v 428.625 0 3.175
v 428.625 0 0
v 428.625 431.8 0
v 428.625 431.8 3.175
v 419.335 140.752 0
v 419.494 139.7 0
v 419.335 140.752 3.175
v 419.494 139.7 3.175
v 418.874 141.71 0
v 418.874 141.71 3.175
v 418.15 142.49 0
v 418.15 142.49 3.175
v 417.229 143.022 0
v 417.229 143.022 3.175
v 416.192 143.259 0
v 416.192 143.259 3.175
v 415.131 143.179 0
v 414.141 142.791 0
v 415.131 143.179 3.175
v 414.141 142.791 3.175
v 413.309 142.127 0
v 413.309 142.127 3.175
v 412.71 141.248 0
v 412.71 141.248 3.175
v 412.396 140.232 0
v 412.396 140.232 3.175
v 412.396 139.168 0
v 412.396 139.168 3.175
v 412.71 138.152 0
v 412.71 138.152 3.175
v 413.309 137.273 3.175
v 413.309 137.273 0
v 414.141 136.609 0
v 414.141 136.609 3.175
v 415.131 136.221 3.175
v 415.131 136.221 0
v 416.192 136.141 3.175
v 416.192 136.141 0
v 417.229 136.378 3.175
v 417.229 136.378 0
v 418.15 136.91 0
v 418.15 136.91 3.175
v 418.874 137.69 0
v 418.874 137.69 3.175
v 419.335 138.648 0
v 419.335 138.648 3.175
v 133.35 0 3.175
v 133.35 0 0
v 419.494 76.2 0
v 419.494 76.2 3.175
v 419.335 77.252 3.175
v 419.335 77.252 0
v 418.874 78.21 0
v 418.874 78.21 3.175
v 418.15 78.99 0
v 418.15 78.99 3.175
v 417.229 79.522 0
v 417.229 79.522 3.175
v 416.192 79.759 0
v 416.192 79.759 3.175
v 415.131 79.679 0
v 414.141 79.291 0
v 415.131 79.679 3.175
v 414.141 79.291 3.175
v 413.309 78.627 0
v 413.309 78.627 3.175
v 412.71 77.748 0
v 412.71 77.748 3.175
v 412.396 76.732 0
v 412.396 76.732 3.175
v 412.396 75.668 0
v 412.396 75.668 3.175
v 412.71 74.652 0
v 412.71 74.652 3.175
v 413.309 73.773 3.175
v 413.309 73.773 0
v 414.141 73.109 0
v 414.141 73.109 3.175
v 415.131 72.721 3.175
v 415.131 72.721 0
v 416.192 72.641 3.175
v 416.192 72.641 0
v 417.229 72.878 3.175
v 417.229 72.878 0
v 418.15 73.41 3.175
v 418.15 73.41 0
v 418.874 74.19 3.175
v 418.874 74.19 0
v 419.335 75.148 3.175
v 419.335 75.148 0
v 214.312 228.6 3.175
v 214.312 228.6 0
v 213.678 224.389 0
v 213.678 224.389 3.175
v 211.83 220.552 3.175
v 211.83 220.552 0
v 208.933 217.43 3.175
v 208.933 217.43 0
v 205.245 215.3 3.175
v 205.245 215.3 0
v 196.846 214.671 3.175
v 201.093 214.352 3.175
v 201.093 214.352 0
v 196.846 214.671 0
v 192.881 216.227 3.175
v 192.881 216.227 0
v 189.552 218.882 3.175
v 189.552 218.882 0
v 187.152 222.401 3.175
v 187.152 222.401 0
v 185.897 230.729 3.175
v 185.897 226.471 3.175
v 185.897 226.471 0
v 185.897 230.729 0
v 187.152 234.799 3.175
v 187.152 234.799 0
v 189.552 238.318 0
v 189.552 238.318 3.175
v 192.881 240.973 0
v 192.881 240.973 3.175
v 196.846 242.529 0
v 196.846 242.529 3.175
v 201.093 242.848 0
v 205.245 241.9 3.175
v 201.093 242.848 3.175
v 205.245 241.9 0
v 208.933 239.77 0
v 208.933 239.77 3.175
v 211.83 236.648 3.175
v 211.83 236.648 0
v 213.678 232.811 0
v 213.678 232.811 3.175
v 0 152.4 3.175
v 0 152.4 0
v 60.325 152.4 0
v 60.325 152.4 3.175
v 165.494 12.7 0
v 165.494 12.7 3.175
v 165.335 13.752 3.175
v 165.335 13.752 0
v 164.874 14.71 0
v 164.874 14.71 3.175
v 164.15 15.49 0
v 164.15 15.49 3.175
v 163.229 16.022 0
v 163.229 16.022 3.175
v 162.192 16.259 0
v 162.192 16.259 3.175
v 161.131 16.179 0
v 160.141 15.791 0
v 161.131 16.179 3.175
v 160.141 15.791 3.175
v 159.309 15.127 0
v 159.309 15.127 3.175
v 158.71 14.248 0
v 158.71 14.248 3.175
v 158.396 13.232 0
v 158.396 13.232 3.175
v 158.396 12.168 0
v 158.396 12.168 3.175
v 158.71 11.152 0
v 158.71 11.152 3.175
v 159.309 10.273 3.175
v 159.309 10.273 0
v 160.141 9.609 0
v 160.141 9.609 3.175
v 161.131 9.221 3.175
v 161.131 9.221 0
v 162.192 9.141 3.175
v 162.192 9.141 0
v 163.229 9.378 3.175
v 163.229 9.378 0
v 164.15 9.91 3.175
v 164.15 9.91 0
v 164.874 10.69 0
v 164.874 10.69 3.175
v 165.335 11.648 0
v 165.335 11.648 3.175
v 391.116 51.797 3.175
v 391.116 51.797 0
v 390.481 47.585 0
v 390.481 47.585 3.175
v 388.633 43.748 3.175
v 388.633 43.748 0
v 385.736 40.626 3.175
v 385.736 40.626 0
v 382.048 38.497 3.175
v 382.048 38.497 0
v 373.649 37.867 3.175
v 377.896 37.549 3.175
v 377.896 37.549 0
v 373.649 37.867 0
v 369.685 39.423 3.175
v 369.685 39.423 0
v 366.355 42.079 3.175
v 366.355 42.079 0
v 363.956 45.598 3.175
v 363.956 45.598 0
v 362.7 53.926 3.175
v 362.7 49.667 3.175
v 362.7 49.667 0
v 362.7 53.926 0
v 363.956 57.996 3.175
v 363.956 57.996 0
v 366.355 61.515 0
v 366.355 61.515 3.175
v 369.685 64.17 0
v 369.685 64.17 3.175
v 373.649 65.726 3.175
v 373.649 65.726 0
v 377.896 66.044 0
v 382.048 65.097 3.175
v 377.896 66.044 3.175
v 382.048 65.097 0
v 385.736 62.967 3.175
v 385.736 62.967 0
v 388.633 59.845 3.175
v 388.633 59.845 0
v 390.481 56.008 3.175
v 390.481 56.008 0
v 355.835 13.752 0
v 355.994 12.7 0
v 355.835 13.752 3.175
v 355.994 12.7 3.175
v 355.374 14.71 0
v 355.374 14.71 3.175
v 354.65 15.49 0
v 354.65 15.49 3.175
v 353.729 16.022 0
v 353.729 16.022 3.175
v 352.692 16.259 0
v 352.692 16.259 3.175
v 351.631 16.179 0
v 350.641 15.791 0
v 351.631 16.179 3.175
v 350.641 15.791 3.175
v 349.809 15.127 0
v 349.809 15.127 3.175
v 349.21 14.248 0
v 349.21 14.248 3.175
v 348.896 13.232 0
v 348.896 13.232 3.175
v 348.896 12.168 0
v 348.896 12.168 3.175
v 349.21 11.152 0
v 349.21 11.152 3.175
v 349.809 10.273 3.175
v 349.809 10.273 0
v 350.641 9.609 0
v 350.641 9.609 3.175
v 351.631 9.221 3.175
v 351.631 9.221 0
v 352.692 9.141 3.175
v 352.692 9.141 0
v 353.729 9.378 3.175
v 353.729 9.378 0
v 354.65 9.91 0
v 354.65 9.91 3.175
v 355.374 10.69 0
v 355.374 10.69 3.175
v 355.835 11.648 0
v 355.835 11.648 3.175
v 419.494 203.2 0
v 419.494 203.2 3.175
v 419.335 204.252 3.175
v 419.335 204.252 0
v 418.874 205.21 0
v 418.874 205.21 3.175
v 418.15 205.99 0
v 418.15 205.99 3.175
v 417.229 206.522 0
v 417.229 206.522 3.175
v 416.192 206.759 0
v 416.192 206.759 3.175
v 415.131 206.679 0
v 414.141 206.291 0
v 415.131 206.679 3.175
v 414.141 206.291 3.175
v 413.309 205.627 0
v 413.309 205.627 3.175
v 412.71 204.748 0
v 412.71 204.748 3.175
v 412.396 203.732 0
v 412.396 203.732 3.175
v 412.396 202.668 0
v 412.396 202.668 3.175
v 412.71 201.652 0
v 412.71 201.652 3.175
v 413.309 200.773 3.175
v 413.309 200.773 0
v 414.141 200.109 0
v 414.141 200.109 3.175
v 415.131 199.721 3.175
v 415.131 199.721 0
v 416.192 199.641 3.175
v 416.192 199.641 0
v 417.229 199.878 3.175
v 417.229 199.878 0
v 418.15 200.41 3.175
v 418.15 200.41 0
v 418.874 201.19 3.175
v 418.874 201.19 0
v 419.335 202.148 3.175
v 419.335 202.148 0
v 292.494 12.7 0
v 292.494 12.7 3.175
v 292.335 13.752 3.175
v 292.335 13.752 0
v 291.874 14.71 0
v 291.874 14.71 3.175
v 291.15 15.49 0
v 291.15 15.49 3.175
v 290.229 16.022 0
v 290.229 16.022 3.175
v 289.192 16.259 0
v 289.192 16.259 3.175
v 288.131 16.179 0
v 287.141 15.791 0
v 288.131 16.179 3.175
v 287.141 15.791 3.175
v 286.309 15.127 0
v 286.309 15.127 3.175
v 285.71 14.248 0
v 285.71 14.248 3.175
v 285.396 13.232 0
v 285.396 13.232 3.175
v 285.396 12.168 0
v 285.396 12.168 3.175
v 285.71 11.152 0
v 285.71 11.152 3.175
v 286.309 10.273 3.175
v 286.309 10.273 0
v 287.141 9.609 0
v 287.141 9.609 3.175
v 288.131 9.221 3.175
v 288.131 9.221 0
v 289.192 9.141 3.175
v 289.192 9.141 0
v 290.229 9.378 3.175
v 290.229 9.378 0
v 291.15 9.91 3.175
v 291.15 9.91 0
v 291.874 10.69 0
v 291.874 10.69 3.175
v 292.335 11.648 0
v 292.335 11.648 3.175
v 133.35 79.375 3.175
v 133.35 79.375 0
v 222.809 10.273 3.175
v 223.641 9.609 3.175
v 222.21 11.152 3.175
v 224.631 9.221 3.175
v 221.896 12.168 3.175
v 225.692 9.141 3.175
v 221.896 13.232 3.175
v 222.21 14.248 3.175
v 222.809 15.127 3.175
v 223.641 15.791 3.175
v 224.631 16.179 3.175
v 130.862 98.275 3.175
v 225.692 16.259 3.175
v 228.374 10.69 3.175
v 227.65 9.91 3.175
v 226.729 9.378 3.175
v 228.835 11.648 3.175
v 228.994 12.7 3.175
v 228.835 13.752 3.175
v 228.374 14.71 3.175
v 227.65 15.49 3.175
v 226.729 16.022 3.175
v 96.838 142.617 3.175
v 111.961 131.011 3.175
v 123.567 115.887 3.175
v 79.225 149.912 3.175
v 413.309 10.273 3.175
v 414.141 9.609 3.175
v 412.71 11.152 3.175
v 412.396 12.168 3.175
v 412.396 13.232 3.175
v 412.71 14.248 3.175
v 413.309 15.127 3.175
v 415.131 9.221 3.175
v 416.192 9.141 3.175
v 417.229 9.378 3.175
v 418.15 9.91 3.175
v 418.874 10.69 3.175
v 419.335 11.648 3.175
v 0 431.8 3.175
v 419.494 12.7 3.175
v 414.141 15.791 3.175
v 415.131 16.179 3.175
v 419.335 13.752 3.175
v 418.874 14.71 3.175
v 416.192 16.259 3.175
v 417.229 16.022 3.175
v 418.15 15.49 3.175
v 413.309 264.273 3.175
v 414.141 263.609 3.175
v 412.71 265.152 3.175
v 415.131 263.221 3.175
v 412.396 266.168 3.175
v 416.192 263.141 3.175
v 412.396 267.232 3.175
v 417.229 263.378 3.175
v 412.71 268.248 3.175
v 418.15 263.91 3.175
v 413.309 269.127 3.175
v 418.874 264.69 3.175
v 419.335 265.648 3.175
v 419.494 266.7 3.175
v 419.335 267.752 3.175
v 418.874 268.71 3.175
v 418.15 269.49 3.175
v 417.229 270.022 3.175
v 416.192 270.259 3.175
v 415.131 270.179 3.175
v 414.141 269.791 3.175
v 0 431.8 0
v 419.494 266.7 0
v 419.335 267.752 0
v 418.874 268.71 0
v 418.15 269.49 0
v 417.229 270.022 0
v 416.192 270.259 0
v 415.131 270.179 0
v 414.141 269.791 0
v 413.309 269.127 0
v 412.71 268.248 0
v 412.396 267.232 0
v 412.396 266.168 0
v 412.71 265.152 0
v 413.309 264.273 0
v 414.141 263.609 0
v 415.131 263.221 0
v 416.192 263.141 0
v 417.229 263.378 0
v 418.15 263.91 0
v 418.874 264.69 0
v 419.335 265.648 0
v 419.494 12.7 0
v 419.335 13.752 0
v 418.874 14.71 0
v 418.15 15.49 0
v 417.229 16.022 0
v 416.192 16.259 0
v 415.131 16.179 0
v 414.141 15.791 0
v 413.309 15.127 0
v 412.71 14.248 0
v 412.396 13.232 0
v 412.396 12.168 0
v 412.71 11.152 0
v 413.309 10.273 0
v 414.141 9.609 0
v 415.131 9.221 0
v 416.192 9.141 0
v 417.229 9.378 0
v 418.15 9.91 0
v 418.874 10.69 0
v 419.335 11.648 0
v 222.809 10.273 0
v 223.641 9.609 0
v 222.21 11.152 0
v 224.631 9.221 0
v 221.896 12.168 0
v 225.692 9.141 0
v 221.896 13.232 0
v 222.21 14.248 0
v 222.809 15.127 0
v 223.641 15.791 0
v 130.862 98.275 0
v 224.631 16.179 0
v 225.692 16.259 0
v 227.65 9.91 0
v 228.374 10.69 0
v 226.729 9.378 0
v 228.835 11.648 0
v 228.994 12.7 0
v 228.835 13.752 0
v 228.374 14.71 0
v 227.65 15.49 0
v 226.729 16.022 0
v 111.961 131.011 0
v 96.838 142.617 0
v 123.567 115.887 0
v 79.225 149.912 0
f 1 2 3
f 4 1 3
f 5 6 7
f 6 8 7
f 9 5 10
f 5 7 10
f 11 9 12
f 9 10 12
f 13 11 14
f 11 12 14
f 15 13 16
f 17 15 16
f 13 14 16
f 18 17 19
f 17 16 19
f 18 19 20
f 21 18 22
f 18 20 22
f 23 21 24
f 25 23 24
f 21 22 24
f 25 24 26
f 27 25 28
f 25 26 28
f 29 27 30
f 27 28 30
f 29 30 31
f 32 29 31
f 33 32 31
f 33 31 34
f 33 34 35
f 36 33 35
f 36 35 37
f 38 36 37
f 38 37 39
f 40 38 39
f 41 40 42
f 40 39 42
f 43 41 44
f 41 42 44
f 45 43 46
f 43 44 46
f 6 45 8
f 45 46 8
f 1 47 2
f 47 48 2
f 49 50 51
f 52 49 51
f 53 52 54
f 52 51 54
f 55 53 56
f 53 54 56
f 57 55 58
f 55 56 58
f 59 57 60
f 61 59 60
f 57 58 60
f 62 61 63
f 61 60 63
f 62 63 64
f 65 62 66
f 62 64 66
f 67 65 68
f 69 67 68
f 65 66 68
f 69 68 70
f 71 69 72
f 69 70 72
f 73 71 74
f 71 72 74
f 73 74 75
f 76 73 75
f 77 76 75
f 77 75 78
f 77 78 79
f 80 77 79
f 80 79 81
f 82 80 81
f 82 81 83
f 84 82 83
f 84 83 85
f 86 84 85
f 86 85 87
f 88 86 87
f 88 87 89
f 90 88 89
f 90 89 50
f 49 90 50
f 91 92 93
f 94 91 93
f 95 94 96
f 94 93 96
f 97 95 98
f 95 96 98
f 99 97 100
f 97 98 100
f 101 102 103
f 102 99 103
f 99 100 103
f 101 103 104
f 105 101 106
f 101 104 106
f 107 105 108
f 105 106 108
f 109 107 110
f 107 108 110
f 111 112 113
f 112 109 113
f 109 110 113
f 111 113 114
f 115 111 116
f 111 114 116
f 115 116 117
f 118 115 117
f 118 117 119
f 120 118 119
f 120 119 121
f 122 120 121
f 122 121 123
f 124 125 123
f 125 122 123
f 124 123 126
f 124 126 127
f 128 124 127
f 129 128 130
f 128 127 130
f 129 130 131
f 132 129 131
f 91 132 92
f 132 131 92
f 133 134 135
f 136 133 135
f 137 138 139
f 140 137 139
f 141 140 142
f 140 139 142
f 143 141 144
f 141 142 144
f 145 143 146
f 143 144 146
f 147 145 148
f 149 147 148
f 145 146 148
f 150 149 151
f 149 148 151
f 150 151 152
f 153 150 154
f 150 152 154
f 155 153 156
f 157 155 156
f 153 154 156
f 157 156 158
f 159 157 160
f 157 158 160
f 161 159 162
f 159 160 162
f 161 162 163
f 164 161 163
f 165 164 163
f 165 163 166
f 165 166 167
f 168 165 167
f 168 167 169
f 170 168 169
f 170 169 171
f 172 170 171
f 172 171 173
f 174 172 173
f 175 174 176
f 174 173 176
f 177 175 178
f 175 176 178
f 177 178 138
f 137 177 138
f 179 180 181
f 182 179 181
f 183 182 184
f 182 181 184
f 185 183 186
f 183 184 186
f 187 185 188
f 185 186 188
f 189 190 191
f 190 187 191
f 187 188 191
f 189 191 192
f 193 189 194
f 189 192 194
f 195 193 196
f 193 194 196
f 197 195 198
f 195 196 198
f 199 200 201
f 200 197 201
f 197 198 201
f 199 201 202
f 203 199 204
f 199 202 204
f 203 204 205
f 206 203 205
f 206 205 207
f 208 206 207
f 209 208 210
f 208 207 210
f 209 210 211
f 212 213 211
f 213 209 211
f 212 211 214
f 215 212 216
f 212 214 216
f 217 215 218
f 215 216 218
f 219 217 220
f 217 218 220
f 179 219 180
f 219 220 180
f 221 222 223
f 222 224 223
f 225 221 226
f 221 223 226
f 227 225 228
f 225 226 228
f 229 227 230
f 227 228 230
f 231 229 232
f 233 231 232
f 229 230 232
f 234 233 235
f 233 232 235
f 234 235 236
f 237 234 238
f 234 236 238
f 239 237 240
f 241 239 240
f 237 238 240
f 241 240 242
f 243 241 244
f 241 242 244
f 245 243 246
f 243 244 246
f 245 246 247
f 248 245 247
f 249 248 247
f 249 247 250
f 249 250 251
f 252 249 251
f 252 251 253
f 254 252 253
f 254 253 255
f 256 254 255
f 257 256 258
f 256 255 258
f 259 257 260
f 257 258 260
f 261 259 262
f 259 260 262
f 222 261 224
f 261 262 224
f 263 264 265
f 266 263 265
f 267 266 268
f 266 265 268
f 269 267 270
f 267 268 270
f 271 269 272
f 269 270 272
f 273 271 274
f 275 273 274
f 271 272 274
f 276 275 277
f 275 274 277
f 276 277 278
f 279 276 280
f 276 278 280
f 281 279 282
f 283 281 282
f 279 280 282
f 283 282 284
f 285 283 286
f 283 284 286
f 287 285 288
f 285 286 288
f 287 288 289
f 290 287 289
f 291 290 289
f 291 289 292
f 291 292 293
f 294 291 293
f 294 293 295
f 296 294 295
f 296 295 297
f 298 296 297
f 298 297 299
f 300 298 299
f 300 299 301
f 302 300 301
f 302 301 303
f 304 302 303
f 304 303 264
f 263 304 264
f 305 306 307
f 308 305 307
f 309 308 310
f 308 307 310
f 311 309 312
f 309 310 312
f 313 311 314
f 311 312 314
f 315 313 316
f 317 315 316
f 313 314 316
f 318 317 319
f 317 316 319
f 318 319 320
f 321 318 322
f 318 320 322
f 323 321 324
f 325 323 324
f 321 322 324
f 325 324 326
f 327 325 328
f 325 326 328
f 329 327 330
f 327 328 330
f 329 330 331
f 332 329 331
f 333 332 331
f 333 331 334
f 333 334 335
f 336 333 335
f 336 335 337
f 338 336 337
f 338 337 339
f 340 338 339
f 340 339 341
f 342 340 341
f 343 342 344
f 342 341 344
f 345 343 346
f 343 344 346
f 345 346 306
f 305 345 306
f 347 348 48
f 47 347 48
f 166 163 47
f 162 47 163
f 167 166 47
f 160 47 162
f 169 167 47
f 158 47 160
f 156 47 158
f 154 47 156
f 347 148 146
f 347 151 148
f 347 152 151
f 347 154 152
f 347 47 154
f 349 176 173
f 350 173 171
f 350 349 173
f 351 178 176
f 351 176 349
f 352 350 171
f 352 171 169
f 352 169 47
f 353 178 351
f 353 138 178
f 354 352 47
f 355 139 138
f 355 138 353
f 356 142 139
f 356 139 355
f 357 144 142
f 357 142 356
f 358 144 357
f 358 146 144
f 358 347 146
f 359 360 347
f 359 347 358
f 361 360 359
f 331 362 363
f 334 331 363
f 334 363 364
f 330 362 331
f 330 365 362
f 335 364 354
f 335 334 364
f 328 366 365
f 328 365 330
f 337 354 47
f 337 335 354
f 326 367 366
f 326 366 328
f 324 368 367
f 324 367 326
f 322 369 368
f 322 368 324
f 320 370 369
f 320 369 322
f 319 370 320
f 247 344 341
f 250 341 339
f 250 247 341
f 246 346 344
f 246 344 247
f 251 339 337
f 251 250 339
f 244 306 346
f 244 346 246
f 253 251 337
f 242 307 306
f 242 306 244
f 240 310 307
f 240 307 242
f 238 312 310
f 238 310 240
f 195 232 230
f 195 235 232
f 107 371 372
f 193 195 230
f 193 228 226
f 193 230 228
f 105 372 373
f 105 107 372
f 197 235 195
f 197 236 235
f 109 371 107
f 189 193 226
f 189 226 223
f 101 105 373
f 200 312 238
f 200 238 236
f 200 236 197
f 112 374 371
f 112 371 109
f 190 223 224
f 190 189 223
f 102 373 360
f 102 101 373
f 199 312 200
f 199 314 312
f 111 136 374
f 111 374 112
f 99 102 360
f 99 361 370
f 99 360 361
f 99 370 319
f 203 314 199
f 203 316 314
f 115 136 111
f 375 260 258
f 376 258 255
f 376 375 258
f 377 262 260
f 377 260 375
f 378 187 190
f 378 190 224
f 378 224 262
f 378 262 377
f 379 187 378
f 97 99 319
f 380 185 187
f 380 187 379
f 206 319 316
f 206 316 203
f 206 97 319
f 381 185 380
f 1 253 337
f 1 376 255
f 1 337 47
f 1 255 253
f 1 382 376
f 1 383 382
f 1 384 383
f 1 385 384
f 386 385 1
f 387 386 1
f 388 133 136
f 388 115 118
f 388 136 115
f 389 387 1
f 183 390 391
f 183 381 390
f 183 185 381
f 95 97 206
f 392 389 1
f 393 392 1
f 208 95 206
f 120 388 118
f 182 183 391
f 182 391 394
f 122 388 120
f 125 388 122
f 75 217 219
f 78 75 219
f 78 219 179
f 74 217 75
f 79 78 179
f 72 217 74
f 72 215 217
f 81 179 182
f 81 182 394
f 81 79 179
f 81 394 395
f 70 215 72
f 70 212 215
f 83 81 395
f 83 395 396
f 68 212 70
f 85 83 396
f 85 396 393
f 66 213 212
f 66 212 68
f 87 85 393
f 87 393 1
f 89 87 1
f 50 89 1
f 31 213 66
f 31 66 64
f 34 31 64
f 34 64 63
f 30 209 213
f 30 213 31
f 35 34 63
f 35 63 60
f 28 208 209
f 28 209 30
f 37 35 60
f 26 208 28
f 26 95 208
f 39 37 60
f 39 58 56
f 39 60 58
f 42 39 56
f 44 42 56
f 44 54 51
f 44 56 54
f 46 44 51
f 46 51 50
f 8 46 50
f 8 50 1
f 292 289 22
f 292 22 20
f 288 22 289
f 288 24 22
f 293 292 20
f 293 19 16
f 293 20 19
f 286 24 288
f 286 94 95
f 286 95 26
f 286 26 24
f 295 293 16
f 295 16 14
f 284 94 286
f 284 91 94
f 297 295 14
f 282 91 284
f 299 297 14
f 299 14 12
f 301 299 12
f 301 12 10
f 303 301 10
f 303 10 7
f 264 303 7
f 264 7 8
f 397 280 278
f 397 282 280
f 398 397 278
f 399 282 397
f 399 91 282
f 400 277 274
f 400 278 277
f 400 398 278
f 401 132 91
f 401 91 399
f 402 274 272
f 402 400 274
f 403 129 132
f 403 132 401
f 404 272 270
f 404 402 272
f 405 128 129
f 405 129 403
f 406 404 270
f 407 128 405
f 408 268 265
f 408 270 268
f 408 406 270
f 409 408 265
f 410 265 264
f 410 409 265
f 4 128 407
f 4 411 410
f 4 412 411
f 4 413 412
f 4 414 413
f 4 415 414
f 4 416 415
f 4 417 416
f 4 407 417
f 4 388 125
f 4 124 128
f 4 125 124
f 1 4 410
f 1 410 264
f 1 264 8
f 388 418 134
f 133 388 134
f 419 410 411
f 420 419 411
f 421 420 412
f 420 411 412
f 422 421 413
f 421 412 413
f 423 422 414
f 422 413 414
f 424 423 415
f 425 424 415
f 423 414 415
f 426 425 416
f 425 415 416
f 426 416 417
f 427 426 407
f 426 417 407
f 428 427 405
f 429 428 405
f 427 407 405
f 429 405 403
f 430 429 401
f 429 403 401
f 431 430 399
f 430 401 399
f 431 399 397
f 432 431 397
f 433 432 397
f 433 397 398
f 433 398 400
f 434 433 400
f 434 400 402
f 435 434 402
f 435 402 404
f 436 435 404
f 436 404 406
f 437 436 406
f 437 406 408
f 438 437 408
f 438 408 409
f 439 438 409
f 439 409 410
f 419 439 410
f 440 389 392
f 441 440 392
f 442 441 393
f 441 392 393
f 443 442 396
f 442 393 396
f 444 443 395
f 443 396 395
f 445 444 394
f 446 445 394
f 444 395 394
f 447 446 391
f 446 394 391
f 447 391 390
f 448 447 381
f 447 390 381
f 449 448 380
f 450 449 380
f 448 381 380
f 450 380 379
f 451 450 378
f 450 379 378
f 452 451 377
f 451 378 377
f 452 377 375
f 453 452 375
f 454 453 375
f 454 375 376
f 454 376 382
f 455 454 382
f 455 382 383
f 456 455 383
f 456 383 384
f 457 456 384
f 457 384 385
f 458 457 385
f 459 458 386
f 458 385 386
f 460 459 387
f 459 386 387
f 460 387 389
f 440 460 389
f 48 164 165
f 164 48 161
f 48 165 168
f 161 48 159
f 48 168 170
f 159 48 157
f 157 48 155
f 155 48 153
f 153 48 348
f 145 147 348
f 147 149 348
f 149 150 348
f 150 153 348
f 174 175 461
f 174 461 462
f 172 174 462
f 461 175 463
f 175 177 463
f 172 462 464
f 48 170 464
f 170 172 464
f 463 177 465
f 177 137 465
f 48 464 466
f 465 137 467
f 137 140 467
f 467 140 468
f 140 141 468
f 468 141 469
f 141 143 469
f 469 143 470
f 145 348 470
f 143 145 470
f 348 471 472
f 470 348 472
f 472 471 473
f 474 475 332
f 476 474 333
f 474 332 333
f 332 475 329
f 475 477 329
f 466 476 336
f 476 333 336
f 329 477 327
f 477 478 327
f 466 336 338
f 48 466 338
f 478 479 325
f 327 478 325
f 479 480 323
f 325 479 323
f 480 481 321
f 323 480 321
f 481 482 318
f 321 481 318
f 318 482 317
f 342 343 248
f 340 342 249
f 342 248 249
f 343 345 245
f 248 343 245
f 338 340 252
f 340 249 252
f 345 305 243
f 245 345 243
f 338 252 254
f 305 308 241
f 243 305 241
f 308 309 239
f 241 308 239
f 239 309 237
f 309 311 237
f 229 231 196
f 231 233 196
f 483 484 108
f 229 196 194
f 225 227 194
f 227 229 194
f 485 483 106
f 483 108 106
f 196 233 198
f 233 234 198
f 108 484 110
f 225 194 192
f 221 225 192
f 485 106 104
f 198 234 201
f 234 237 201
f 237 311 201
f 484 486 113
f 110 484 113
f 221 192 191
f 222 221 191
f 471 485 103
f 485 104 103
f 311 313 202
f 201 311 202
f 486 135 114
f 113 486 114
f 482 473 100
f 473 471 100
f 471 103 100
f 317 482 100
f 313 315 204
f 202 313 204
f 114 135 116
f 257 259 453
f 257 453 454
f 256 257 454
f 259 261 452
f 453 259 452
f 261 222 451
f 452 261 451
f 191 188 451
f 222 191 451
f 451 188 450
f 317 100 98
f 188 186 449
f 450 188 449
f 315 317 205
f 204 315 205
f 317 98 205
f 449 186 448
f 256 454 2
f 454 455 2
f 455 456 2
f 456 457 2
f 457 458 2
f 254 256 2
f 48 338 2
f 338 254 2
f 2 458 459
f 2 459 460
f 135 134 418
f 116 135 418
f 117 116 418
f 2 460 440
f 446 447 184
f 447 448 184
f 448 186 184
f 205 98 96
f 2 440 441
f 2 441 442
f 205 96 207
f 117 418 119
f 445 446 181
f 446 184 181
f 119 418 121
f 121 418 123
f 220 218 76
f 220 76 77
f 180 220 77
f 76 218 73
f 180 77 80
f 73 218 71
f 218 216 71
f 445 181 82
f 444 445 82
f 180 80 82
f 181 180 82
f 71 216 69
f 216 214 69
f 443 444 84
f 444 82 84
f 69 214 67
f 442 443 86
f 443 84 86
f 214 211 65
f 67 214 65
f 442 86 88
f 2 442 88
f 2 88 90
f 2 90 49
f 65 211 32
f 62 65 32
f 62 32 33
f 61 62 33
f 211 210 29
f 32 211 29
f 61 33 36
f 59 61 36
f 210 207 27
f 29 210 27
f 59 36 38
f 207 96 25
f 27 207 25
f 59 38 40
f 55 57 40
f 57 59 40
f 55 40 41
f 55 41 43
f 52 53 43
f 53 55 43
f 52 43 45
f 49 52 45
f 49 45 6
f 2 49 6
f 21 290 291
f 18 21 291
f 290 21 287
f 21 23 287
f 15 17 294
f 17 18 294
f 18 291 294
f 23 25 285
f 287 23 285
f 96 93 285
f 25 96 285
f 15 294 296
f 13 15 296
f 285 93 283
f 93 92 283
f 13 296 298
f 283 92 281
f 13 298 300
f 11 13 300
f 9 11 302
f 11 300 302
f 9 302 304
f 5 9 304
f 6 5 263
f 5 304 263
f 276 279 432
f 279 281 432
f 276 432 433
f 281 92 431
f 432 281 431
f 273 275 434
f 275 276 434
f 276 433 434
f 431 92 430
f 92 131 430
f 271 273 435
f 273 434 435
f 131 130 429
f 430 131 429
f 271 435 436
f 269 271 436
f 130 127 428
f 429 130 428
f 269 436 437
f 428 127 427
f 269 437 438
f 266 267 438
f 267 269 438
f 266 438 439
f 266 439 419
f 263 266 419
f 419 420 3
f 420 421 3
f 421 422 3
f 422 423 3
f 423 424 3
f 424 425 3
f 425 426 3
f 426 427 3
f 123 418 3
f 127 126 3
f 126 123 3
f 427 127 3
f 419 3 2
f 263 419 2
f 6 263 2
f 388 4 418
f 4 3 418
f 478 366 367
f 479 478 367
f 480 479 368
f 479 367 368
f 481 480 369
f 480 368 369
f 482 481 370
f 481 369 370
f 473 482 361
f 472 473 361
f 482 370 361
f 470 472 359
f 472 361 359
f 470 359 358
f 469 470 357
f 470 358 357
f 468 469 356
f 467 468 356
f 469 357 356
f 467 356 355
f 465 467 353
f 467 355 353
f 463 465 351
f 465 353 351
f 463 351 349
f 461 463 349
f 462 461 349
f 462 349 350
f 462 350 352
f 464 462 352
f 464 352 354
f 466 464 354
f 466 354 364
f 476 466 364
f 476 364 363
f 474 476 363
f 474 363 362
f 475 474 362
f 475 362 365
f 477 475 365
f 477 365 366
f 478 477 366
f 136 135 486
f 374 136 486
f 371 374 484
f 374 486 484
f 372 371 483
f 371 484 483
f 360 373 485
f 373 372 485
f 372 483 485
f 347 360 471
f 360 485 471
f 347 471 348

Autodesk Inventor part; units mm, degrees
ref_plane "YZ Plane" through (0, 0, 0) normal (1, 0, 0) x (0, 1, 0)
ref_plane "XZ Plane" through (0, 0, 0) normal (0, 1, 0) x (-1, 0, 0)
ref_plane "XY Plane" through (0, 0, 0) normal (0, 0, 1) x (1, 0, 0)
sketch "Sketch1" plane through (0, 0, 0) normal (0, 0, 1) x (1, 0, 0)
  line L0 (133.35, 0) -> (428.625, 0)
  line L1 (428.625, 0) -> (428.625, 431.8)
  line L2 (428.625, 431.8) -> (0, 431.8)
  circle A0 centre (200.025, 228.6) radius 14.2875
  circle A1 centre (200.025, 228.6) radius 250.0376 construction
  circle A2 centre (376.8283, 51.7967) radius 14.2875
  line L3 (200.025, 228.6) -> (428.625, 0) construction
  line L4 (0, 152.4) -> (60.325, 152.4)
  line L5 (133.35, 79.375) -> (133.35, 0)
  arc A3 (133.35, 79.375) -> (60.325, 152.4) centre (60.325, 79.375) ccw
  line L6 (0, 431.8) -> (0, 152.4)
  point P0 (0, 0)
  dimension "d5" = 500.0752
  dimension "d0" = 428.625
  dimension "d1" = 431.8
  dimension "d2" = 28.575
  dimension "d3" = 228.6
  dimension "d4" = 228.6
  dimension "d6" = 28.575
  dimension "d7" = 152.4
  dimension "d8" = 295.275
  dimension "d9" = 73.025
extrude "Extrusion1" add sketch "Sketch1" along normal blind 3.175
sketch "Sketch2" plane through (0, 0, 3.175) normal (0, 0, 1) x (1, 0, 0)
  circle A0 centre (415.925, 12.7) radius 3.5687
  line L0 (133.35, 0) -> (428.625, 0) projected
  line L1 (428.625, 0) -> (428.625, 431.8) projected
  circle A1 centre (415.925, 76.2) radius 3.5687
  circle A2 centre (415.925, 139.7) radius 3.5687
  circle A3 centre (415.925, 203.2) radius 3.5687
  circle A4 centre (415.925, 266.7) radius 3.5687
  circle A5 centre (352.425, 12.7) radius 3.5687
  circle A6 centre (288.925, 12.7) radius 3.5687
  circle A7 centre (225.425, 12.7) radius 3.5687
  circle A8 centre (161.925, 12.7) radius 3.5687
  point P0 (0, 0)
  dimension "d12" = 7.1374
  dimension "d13" = 12.7
  dimension "d14" = 12.7
  dimension "d17" = 63.5
  dimension "d27" = 63.5
extrude "Extrusion2" cut sketch "Sketch2" against normal blind 3.175
properties part number "1073-2017 Shooter Outside Plate Left"
